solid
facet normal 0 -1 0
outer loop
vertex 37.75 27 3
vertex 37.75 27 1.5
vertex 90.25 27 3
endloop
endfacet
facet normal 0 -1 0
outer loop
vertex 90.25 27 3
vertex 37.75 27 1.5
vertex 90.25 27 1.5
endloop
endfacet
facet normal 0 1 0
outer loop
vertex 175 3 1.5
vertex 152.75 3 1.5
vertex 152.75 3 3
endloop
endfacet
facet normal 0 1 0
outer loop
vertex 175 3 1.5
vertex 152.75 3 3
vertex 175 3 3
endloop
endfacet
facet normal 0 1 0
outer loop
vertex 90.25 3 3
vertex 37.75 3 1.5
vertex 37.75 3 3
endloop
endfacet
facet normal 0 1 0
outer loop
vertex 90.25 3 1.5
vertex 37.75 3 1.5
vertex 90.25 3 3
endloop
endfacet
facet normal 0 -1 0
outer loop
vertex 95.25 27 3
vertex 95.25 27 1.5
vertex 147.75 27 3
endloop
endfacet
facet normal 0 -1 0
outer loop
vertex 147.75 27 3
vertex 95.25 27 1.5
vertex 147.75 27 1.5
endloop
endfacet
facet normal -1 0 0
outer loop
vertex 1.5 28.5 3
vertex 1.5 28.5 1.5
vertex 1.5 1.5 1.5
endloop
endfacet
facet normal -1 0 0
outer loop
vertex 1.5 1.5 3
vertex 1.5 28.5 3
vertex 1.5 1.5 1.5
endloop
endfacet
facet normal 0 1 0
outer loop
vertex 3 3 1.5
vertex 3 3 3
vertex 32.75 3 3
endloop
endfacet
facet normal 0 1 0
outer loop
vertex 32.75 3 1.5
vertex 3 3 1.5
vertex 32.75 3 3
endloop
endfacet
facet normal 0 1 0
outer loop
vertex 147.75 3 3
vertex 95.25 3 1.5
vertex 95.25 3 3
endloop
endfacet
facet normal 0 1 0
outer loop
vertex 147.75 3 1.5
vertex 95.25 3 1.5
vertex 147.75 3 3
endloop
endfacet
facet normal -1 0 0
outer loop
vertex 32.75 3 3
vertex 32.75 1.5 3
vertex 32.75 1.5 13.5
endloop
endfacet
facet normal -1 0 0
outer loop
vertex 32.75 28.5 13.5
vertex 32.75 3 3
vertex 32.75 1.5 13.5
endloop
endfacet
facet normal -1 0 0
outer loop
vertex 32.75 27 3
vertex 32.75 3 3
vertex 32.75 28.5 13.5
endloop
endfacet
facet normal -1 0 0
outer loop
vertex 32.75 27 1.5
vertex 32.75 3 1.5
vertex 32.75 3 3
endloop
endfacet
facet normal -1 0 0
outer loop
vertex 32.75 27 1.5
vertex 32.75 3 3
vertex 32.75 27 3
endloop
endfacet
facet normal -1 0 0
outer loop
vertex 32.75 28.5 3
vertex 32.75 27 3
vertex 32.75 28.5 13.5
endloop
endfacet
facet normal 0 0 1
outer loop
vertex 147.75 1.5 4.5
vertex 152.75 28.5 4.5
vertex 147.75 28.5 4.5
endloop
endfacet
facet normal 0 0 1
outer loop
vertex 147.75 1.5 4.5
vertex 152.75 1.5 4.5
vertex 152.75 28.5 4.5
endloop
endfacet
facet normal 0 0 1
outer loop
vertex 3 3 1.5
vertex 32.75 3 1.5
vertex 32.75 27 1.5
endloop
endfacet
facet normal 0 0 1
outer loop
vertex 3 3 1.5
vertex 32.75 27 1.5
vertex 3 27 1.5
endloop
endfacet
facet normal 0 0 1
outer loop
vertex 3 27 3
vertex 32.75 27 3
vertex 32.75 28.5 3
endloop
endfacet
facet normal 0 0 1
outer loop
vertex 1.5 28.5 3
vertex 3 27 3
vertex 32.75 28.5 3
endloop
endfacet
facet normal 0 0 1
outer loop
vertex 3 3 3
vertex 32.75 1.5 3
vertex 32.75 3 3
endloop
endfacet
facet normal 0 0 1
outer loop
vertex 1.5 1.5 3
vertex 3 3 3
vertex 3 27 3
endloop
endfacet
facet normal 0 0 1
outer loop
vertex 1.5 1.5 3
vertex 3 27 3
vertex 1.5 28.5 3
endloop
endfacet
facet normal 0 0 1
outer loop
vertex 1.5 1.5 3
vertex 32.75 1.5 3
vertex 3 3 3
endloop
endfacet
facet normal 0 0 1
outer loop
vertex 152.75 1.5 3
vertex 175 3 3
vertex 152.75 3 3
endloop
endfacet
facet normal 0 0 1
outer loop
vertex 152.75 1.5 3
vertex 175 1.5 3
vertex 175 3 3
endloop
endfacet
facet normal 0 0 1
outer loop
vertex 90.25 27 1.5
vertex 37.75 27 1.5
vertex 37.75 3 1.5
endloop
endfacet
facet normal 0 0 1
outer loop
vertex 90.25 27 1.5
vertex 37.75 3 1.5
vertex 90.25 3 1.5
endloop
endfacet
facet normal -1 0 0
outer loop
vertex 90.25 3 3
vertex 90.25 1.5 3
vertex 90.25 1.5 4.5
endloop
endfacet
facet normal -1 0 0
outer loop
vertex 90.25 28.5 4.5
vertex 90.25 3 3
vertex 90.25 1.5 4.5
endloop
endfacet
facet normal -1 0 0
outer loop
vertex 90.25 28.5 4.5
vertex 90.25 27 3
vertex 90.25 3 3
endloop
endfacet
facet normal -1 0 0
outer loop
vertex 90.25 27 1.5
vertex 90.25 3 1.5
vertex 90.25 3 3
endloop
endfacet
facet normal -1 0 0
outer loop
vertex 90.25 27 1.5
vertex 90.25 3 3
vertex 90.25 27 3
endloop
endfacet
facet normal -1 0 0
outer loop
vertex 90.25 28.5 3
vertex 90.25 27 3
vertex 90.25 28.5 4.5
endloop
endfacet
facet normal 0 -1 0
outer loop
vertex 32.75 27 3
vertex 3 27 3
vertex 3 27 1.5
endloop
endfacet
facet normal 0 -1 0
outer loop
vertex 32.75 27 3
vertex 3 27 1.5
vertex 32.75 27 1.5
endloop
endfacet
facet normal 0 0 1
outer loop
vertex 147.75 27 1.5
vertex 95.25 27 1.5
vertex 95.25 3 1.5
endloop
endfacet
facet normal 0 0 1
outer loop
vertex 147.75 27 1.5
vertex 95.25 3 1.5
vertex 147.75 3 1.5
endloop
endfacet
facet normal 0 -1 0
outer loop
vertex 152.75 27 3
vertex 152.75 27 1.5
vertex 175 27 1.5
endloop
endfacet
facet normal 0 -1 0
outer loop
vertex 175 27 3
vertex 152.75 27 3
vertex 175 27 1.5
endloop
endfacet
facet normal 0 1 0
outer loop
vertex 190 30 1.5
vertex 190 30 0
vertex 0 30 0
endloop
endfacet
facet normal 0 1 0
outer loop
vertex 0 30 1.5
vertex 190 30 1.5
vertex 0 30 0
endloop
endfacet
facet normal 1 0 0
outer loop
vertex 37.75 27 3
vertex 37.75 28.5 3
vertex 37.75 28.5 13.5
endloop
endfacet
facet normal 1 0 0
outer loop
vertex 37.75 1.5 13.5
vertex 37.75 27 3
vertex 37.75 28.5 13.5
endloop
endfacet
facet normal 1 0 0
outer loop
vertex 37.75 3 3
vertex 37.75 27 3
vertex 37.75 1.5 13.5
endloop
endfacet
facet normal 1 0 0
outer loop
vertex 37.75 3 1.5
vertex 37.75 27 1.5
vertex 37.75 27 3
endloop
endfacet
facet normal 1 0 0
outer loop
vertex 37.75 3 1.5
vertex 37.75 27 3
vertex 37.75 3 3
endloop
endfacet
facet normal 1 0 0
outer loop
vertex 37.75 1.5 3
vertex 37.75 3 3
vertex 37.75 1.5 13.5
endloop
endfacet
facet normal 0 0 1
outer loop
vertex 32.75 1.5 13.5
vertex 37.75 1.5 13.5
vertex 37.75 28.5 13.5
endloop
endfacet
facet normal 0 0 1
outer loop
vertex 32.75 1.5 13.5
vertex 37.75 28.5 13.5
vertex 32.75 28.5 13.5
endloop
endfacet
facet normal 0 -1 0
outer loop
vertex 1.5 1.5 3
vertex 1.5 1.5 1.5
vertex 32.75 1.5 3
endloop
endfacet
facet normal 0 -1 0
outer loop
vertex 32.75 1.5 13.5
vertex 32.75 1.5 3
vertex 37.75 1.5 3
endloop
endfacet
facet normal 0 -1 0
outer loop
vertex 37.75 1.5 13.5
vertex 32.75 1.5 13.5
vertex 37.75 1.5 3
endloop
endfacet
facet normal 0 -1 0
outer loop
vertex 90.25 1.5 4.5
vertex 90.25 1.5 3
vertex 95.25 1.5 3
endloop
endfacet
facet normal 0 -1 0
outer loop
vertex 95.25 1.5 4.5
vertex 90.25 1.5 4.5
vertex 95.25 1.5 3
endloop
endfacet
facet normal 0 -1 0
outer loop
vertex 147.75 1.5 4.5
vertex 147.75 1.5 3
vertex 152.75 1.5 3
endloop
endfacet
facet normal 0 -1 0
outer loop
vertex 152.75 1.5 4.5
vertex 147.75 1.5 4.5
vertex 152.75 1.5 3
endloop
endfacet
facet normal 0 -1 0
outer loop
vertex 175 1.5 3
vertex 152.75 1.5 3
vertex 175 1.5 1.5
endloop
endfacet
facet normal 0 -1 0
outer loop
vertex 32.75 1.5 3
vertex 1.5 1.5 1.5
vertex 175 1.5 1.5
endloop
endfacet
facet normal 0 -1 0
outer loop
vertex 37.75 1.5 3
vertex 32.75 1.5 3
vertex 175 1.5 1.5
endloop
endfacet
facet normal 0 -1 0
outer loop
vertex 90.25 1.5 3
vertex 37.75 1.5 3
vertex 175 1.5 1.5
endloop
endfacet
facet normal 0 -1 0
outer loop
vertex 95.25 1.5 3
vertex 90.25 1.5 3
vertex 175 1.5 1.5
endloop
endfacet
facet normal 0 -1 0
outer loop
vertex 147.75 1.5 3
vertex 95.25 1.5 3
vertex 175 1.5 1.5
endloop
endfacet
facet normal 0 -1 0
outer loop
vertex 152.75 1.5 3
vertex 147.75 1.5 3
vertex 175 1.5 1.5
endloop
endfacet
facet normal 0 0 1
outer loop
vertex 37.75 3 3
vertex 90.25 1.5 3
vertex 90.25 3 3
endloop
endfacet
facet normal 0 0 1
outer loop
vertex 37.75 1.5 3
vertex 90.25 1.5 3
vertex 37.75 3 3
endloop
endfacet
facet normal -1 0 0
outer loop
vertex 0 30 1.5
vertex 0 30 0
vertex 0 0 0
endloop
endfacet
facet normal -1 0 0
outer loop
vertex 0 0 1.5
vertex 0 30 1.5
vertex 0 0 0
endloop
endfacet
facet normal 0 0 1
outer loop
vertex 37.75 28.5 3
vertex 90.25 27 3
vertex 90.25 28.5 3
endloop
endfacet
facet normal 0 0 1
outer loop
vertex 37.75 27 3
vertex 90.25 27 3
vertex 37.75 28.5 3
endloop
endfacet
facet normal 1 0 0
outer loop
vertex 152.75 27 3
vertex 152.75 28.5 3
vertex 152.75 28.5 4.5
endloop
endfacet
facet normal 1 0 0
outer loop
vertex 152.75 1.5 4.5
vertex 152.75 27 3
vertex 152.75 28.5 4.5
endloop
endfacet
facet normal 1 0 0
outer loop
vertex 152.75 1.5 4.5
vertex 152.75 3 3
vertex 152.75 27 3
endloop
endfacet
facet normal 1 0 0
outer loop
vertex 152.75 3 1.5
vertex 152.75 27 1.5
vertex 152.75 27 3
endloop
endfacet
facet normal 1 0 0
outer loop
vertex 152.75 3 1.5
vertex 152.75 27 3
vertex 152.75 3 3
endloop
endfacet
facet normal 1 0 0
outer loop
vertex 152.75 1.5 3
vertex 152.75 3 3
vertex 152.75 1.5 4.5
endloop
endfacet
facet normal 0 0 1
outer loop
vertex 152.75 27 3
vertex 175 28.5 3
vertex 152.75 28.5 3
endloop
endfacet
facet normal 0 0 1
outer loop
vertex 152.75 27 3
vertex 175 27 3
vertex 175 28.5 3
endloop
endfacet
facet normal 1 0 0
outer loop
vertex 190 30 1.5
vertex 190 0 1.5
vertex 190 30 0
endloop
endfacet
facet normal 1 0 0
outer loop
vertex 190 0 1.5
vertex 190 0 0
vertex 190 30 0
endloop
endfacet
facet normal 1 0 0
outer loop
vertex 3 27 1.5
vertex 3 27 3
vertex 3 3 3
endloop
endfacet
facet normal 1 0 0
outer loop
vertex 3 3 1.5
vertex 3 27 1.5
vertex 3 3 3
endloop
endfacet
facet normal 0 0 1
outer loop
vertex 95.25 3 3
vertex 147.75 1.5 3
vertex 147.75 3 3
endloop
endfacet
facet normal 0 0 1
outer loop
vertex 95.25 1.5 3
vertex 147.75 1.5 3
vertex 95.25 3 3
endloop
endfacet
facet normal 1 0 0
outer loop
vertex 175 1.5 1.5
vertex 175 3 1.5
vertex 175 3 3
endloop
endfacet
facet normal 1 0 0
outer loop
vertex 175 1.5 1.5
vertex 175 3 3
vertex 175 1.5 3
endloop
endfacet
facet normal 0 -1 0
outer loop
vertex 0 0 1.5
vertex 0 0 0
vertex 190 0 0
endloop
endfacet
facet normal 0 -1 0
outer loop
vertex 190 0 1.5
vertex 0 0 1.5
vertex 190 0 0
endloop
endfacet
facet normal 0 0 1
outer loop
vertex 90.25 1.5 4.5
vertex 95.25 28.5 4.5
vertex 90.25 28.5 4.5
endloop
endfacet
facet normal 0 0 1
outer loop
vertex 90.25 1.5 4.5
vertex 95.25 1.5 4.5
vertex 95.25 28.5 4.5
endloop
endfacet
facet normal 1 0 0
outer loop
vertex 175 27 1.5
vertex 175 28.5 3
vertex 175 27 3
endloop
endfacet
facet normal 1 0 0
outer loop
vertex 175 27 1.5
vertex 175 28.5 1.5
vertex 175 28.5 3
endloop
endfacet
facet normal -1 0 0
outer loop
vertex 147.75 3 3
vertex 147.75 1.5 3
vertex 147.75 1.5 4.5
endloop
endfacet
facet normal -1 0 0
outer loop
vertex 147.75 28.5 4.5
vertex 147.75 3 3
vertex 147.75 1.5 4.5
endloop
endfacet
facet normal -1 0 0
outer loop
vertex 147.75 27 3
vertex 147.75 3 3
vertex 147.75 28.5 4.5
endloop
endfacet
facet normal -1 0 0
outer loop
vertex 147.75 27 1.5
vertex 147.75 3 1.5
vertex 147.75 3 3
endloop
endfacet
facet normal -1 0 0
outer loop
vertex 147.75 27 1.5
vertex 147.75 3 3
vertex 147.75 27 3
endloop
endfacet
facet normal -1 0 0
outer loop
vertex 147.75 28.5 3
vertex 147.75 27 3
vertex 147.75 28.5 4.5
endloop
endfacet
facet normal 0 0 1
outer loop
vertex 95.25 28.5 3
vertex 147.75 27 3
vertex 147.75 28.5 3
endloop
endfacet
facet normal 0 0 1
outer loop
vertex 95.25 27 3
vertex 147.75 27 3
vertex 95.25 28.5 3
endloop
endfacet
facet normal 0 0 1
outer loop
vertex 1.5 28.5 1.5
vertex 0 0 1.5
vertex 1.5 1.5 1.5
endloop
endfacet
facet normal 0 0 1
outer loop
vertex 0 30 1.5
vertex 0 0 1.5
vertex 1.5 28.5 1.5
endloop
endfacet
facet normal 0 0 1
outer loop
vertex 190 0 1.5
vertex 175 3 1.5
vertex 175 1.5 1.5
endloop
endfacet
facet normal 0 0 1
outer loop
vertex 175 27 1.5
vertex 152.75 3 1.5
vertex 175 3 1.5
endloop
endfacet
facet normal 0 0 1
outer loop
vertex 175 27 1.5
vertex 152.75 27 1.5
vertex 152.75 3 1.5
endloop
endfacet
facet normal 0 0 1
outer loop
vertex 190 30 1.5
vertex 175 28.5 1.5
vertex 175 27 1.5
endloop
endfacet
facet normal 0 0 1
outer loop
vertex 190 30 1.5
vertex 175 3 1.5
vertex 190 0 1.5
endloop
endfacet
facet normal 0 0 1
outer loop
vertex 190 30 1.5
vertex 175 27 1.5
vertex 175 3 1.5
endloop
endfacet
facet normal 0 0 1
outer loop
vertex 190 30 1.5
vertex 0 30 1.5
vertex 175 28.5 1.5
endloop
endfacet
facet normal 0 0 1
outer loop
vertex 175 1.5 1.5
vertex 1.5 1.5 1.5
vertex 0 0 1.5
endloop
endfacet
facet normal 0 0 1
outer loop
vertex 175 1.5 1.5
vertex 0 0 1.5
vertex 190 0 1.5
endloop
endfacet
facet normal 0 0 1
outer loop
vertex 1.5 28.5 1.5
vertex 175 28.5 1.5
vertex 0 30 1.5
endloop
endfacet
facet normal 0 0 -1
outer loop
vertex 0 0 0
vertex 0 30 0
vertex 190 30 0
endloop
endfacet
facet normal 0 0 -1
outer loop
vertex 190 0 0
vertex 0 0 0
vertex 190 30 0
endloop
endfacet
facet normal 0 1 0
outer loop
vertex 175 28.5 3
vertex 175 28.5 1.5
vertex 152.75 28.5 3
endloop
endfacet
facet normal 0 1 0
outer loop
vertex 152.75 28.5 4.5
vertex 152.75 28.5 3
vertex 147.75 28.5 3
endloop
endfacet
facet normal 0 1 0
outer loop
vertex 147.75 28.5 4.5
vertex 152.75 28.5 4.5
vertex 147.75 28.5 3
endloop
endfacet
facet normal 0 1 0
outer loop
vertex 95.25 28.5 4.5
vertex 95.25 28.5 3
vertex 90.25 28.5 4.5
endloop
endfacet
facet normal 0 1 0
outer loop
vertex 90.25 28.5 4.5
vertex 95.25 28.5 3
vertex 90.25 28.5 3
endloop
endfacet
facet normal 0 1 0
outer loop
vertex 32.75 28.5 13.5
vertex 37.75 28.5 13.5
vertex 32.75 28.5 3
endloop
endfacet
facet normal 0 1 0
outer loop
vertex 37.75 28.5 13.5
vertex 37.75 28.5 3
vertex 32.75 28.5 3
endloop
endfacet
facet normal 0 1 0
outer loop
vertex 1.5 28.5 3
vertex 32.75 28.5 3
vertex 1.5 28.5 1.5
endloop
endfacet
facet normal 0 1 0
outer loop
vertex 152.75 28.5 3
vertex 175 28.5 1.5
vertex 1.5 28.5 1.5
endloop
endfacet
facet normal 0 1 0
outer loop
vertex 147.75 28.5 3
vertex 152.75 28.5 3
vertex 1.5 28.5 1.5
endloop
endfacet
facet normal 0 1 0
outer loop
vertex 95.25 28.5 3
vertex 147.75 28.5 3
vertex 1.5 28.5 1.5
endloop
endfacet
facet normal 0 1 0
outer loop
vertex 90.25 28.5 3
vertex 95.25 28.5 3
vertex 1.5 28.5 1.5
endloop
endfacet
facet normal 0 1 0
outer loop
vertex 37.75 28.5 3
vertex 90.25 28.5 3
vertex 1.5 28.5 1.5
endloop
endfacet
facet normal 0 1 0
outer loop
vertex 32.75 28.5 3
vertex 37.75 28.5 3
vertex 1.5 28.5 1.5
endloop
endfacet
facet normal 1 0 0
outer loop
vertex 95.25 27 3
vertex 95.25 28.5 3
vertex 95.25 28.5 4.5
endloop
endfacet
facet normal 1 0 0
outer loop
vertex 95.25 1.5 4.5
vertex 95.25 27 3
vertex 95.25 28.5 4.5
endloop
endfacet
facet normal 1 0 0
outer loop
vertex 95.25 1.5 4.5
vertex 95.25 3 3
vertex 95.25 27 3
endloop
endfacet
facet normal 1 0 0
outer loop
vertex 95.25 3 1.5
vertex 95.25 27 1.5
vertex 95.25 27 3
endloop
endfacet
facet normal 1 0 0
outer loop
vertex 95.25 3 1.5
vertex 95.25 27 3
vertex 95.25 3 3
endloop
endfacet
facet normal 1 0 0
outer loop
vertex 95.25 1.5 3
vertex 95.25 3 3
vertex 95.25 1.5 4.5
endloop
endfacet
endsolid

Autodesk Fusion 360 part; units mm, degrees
sketch "Sketch1" plane through (0, 0, 0) normal (0, 0, 1) x (1, 0, 0)
  line L0 (0, 0) -> (190, 0)
  line L1 (190, 0) -> (190, 30)
  line L2 (190, 30) -> (0, 30)
  line L3 (0, 30) -> (0, 0)
  dimension "d1" = 190
  dimension "d2" = 30
extrude "Extrude1" add sketch "Sketch1" along normal blind 1.5
sketch "Sketch2" plane through (0, 0, 1.5) normal (0, 0, 1) x (-1, 0, 0)
  line L0 (0, -30) -> (0, 0)
  line L1 (0, 0) -> (-190, 0)
  line L2 (-190, 0) -> (-190, -30)
  line L3 (-190, -30) -> (0, -30)
  line L4 (-1.5, -1.5) -> (-188.5, -1.5)
  line L5 (-188.5, -1.5) -> (-188.5, -28.5)
  line L6 (-188.5, -28.5) -> (-1.5, -28.5)
  line L7 (-1.5, -28.5) -> (-1.5, -1.5)
  line L8 (-32.75, -28.5) -> (-37.75, -28.5)
  line L9 (-37.75, -28.5) -> (-37.75, -1.5)
  line L10 (-37.75, -1.5) -> (-32.75, -1.5)
  line L11 (-32.75, -1.5) -> (-32.75, -28.5)
  line L12 (-188.5, -28.5) -> (-157.25, -28.5)
  line L13 (-90.25, -28.5) -> (-95.25, -28.5)
  line L14 (-90.25, -1.5) -> (-90.25, -28.5)
  line L15 (-95.25, -28.5) -> (-95.25, -1.5)
  line L16 (-95.25, -1.5) -> (-90.25, -1.5)
  line L17 (-147.75, -28.5) -> (-152.75, -28.5)
  line L18 (-147.75, -1.5) -> (-147.75, -28.5)
  line L19 (-152.75, -28.5) -> (-152.75, -1.5)
  line L20 (-152.75, -1.5) -> (-147.75, -1.5)
  dimension "d5" = -1.5
  dimension "d6" = 5
  dimension "d7" = 31.25
  dimension "d8" = 31.25
  dimension "d11" = -115
  dimension "d12" = 0
extrude "Extrude2" add sketch "Sketch2" along normal blind 12 contours L4 L6 L8 L9 L10 L11
extrude "Extrude3" add sketch "Sketch2" along normal blind 3 contours L4 L6 L13 L14 L15 L16 | L4 L6 L17 L18 L19 L20
extrude "Extrude4" add sketch "Sketch2" along normal blind 1.5 contours L4 L6 L7 L11
sketch "Sketch3" plane through (0, 0, 3) normal (0, 0, 1) x (-1, 0, 0)
  line L0 (-32.75, -1.5) -> (-32.75, -28.5)
  line L1 (-32.75, -28.5) -> (-1.5, -28.5)
  line L2 (-1.5, -28.5) -> (-1.5, -1.5)
  line L3 (-1.5, -1.5) -> (-32.75, -1.5)
  line L4 (-3, -3) -> (-31.25, -3)
  line L5 (-31.25, -27) -> (-3, -27)
  line L6 (-3, -27) -> (-3, -3)
  line L7 (-31.25, -3) -> (-32.75, -3)
  line L8 (-31.25, -27) -> (-32.75, -27)
extrude "Extrude5" cut sketch "Sketch3" against normal blind 1.5 contours L0 L4 L5 L6 L7 L8
sketch "Sketch4" plane through (0, 0, 1.5) normal (0, 0, 1) x (-1, 0, 0)
  line L0 (0, -30) -> (0, 0)
  line L1 (0, 0) -> (-190, 0)
  line L2 (-190, 0) -> (-190, -30)
  line L3 (-190, -30) -> (0, -30)
  line L4 (-37.75, -1.5) -> (-1.5, -1.5)
  line L5 (-1.5, -1.5) -> (-1.5, -28.5)
  line L6 (-1.5, -28.5) -> (-37.75, -28.5)
  line L7 (-37.75, -28.5) -> (-37.75, -1.5)
  line L8 (-95.25, -1.5) -> (-90.25, -1.5)
  line L9 (-90.25, -1.5) -> (-90.25, -28.5)
  line L10 (-90.25, -28.5) -> (-95.25, -28.5)
  line L11 (-95.25, -28.5) -> (-95.25, -1.5)
  line L12 (-152.75, -1.5) -> (-147.75, -1.5)
  line L13 (-147.75, -1.5) -> (-147.75, -28.5)
  line L14 (-147.75, -28.5) -> (-152.75, -28.5)
  line L15 (-152.75, -28.5) -> (-152.75, -1.5)
  line L16 (-190, -28.5) -> (-37.75, -28.5)
  line L17 (-37.75, -28.5) -> (-37.75, -27)
  line L18 (-37.75, -27) -> (-190, -27)
  line L19 (-190, -27) -> (-190, -28.5)
  line L20 (-190, -1.5) -> (-37.75, -1.5)
  line L21 (-37.75, -1.5) -> (-37.75, -3)
  line L22 (-37.75, -3) -> (-190, -3)
  line L23 (-190, -3) -> (-190, -1.5)
  line L24 (0, 0) -> (-190, 0)
  line L25 (-190, -30) -> (0, -30)
  line L26 (-95.25, -28.5) -> (-95.25, -1.5)
  line L27 (-37.75, -28.5) -> (-37.75, -1.5)
  line L28 (-175, -28.5) -> (-175, -27)
  line L29 (-175, -3) -> (-175, -1.5)
  line L30 (-190, 0) -> (-190, -30)
  dimension "d22" = 1.5
  dimension "d23" = 1.5
  dimension "d24" = 1.5
  dimension "d25" = 1.5
  dimension "d26" = 15
  dimension "d27" = 15
extrude "Extrude6" add sketch "Sketch4" along normal blind 1.5 contours L15 L16 L18 L28 | L15 L20 L22 L29 | L11 L13 L16 L18 L26 | L11 L13 L20 L22 L26 | L7 L9 L16 L17 L18 L27 | L7 L9 L20 L21 L22 L27
component "Lid" placed x (1, 0, 0) y (0, 1, 0) z (0, 0, 1) at (0, 0, 0)
